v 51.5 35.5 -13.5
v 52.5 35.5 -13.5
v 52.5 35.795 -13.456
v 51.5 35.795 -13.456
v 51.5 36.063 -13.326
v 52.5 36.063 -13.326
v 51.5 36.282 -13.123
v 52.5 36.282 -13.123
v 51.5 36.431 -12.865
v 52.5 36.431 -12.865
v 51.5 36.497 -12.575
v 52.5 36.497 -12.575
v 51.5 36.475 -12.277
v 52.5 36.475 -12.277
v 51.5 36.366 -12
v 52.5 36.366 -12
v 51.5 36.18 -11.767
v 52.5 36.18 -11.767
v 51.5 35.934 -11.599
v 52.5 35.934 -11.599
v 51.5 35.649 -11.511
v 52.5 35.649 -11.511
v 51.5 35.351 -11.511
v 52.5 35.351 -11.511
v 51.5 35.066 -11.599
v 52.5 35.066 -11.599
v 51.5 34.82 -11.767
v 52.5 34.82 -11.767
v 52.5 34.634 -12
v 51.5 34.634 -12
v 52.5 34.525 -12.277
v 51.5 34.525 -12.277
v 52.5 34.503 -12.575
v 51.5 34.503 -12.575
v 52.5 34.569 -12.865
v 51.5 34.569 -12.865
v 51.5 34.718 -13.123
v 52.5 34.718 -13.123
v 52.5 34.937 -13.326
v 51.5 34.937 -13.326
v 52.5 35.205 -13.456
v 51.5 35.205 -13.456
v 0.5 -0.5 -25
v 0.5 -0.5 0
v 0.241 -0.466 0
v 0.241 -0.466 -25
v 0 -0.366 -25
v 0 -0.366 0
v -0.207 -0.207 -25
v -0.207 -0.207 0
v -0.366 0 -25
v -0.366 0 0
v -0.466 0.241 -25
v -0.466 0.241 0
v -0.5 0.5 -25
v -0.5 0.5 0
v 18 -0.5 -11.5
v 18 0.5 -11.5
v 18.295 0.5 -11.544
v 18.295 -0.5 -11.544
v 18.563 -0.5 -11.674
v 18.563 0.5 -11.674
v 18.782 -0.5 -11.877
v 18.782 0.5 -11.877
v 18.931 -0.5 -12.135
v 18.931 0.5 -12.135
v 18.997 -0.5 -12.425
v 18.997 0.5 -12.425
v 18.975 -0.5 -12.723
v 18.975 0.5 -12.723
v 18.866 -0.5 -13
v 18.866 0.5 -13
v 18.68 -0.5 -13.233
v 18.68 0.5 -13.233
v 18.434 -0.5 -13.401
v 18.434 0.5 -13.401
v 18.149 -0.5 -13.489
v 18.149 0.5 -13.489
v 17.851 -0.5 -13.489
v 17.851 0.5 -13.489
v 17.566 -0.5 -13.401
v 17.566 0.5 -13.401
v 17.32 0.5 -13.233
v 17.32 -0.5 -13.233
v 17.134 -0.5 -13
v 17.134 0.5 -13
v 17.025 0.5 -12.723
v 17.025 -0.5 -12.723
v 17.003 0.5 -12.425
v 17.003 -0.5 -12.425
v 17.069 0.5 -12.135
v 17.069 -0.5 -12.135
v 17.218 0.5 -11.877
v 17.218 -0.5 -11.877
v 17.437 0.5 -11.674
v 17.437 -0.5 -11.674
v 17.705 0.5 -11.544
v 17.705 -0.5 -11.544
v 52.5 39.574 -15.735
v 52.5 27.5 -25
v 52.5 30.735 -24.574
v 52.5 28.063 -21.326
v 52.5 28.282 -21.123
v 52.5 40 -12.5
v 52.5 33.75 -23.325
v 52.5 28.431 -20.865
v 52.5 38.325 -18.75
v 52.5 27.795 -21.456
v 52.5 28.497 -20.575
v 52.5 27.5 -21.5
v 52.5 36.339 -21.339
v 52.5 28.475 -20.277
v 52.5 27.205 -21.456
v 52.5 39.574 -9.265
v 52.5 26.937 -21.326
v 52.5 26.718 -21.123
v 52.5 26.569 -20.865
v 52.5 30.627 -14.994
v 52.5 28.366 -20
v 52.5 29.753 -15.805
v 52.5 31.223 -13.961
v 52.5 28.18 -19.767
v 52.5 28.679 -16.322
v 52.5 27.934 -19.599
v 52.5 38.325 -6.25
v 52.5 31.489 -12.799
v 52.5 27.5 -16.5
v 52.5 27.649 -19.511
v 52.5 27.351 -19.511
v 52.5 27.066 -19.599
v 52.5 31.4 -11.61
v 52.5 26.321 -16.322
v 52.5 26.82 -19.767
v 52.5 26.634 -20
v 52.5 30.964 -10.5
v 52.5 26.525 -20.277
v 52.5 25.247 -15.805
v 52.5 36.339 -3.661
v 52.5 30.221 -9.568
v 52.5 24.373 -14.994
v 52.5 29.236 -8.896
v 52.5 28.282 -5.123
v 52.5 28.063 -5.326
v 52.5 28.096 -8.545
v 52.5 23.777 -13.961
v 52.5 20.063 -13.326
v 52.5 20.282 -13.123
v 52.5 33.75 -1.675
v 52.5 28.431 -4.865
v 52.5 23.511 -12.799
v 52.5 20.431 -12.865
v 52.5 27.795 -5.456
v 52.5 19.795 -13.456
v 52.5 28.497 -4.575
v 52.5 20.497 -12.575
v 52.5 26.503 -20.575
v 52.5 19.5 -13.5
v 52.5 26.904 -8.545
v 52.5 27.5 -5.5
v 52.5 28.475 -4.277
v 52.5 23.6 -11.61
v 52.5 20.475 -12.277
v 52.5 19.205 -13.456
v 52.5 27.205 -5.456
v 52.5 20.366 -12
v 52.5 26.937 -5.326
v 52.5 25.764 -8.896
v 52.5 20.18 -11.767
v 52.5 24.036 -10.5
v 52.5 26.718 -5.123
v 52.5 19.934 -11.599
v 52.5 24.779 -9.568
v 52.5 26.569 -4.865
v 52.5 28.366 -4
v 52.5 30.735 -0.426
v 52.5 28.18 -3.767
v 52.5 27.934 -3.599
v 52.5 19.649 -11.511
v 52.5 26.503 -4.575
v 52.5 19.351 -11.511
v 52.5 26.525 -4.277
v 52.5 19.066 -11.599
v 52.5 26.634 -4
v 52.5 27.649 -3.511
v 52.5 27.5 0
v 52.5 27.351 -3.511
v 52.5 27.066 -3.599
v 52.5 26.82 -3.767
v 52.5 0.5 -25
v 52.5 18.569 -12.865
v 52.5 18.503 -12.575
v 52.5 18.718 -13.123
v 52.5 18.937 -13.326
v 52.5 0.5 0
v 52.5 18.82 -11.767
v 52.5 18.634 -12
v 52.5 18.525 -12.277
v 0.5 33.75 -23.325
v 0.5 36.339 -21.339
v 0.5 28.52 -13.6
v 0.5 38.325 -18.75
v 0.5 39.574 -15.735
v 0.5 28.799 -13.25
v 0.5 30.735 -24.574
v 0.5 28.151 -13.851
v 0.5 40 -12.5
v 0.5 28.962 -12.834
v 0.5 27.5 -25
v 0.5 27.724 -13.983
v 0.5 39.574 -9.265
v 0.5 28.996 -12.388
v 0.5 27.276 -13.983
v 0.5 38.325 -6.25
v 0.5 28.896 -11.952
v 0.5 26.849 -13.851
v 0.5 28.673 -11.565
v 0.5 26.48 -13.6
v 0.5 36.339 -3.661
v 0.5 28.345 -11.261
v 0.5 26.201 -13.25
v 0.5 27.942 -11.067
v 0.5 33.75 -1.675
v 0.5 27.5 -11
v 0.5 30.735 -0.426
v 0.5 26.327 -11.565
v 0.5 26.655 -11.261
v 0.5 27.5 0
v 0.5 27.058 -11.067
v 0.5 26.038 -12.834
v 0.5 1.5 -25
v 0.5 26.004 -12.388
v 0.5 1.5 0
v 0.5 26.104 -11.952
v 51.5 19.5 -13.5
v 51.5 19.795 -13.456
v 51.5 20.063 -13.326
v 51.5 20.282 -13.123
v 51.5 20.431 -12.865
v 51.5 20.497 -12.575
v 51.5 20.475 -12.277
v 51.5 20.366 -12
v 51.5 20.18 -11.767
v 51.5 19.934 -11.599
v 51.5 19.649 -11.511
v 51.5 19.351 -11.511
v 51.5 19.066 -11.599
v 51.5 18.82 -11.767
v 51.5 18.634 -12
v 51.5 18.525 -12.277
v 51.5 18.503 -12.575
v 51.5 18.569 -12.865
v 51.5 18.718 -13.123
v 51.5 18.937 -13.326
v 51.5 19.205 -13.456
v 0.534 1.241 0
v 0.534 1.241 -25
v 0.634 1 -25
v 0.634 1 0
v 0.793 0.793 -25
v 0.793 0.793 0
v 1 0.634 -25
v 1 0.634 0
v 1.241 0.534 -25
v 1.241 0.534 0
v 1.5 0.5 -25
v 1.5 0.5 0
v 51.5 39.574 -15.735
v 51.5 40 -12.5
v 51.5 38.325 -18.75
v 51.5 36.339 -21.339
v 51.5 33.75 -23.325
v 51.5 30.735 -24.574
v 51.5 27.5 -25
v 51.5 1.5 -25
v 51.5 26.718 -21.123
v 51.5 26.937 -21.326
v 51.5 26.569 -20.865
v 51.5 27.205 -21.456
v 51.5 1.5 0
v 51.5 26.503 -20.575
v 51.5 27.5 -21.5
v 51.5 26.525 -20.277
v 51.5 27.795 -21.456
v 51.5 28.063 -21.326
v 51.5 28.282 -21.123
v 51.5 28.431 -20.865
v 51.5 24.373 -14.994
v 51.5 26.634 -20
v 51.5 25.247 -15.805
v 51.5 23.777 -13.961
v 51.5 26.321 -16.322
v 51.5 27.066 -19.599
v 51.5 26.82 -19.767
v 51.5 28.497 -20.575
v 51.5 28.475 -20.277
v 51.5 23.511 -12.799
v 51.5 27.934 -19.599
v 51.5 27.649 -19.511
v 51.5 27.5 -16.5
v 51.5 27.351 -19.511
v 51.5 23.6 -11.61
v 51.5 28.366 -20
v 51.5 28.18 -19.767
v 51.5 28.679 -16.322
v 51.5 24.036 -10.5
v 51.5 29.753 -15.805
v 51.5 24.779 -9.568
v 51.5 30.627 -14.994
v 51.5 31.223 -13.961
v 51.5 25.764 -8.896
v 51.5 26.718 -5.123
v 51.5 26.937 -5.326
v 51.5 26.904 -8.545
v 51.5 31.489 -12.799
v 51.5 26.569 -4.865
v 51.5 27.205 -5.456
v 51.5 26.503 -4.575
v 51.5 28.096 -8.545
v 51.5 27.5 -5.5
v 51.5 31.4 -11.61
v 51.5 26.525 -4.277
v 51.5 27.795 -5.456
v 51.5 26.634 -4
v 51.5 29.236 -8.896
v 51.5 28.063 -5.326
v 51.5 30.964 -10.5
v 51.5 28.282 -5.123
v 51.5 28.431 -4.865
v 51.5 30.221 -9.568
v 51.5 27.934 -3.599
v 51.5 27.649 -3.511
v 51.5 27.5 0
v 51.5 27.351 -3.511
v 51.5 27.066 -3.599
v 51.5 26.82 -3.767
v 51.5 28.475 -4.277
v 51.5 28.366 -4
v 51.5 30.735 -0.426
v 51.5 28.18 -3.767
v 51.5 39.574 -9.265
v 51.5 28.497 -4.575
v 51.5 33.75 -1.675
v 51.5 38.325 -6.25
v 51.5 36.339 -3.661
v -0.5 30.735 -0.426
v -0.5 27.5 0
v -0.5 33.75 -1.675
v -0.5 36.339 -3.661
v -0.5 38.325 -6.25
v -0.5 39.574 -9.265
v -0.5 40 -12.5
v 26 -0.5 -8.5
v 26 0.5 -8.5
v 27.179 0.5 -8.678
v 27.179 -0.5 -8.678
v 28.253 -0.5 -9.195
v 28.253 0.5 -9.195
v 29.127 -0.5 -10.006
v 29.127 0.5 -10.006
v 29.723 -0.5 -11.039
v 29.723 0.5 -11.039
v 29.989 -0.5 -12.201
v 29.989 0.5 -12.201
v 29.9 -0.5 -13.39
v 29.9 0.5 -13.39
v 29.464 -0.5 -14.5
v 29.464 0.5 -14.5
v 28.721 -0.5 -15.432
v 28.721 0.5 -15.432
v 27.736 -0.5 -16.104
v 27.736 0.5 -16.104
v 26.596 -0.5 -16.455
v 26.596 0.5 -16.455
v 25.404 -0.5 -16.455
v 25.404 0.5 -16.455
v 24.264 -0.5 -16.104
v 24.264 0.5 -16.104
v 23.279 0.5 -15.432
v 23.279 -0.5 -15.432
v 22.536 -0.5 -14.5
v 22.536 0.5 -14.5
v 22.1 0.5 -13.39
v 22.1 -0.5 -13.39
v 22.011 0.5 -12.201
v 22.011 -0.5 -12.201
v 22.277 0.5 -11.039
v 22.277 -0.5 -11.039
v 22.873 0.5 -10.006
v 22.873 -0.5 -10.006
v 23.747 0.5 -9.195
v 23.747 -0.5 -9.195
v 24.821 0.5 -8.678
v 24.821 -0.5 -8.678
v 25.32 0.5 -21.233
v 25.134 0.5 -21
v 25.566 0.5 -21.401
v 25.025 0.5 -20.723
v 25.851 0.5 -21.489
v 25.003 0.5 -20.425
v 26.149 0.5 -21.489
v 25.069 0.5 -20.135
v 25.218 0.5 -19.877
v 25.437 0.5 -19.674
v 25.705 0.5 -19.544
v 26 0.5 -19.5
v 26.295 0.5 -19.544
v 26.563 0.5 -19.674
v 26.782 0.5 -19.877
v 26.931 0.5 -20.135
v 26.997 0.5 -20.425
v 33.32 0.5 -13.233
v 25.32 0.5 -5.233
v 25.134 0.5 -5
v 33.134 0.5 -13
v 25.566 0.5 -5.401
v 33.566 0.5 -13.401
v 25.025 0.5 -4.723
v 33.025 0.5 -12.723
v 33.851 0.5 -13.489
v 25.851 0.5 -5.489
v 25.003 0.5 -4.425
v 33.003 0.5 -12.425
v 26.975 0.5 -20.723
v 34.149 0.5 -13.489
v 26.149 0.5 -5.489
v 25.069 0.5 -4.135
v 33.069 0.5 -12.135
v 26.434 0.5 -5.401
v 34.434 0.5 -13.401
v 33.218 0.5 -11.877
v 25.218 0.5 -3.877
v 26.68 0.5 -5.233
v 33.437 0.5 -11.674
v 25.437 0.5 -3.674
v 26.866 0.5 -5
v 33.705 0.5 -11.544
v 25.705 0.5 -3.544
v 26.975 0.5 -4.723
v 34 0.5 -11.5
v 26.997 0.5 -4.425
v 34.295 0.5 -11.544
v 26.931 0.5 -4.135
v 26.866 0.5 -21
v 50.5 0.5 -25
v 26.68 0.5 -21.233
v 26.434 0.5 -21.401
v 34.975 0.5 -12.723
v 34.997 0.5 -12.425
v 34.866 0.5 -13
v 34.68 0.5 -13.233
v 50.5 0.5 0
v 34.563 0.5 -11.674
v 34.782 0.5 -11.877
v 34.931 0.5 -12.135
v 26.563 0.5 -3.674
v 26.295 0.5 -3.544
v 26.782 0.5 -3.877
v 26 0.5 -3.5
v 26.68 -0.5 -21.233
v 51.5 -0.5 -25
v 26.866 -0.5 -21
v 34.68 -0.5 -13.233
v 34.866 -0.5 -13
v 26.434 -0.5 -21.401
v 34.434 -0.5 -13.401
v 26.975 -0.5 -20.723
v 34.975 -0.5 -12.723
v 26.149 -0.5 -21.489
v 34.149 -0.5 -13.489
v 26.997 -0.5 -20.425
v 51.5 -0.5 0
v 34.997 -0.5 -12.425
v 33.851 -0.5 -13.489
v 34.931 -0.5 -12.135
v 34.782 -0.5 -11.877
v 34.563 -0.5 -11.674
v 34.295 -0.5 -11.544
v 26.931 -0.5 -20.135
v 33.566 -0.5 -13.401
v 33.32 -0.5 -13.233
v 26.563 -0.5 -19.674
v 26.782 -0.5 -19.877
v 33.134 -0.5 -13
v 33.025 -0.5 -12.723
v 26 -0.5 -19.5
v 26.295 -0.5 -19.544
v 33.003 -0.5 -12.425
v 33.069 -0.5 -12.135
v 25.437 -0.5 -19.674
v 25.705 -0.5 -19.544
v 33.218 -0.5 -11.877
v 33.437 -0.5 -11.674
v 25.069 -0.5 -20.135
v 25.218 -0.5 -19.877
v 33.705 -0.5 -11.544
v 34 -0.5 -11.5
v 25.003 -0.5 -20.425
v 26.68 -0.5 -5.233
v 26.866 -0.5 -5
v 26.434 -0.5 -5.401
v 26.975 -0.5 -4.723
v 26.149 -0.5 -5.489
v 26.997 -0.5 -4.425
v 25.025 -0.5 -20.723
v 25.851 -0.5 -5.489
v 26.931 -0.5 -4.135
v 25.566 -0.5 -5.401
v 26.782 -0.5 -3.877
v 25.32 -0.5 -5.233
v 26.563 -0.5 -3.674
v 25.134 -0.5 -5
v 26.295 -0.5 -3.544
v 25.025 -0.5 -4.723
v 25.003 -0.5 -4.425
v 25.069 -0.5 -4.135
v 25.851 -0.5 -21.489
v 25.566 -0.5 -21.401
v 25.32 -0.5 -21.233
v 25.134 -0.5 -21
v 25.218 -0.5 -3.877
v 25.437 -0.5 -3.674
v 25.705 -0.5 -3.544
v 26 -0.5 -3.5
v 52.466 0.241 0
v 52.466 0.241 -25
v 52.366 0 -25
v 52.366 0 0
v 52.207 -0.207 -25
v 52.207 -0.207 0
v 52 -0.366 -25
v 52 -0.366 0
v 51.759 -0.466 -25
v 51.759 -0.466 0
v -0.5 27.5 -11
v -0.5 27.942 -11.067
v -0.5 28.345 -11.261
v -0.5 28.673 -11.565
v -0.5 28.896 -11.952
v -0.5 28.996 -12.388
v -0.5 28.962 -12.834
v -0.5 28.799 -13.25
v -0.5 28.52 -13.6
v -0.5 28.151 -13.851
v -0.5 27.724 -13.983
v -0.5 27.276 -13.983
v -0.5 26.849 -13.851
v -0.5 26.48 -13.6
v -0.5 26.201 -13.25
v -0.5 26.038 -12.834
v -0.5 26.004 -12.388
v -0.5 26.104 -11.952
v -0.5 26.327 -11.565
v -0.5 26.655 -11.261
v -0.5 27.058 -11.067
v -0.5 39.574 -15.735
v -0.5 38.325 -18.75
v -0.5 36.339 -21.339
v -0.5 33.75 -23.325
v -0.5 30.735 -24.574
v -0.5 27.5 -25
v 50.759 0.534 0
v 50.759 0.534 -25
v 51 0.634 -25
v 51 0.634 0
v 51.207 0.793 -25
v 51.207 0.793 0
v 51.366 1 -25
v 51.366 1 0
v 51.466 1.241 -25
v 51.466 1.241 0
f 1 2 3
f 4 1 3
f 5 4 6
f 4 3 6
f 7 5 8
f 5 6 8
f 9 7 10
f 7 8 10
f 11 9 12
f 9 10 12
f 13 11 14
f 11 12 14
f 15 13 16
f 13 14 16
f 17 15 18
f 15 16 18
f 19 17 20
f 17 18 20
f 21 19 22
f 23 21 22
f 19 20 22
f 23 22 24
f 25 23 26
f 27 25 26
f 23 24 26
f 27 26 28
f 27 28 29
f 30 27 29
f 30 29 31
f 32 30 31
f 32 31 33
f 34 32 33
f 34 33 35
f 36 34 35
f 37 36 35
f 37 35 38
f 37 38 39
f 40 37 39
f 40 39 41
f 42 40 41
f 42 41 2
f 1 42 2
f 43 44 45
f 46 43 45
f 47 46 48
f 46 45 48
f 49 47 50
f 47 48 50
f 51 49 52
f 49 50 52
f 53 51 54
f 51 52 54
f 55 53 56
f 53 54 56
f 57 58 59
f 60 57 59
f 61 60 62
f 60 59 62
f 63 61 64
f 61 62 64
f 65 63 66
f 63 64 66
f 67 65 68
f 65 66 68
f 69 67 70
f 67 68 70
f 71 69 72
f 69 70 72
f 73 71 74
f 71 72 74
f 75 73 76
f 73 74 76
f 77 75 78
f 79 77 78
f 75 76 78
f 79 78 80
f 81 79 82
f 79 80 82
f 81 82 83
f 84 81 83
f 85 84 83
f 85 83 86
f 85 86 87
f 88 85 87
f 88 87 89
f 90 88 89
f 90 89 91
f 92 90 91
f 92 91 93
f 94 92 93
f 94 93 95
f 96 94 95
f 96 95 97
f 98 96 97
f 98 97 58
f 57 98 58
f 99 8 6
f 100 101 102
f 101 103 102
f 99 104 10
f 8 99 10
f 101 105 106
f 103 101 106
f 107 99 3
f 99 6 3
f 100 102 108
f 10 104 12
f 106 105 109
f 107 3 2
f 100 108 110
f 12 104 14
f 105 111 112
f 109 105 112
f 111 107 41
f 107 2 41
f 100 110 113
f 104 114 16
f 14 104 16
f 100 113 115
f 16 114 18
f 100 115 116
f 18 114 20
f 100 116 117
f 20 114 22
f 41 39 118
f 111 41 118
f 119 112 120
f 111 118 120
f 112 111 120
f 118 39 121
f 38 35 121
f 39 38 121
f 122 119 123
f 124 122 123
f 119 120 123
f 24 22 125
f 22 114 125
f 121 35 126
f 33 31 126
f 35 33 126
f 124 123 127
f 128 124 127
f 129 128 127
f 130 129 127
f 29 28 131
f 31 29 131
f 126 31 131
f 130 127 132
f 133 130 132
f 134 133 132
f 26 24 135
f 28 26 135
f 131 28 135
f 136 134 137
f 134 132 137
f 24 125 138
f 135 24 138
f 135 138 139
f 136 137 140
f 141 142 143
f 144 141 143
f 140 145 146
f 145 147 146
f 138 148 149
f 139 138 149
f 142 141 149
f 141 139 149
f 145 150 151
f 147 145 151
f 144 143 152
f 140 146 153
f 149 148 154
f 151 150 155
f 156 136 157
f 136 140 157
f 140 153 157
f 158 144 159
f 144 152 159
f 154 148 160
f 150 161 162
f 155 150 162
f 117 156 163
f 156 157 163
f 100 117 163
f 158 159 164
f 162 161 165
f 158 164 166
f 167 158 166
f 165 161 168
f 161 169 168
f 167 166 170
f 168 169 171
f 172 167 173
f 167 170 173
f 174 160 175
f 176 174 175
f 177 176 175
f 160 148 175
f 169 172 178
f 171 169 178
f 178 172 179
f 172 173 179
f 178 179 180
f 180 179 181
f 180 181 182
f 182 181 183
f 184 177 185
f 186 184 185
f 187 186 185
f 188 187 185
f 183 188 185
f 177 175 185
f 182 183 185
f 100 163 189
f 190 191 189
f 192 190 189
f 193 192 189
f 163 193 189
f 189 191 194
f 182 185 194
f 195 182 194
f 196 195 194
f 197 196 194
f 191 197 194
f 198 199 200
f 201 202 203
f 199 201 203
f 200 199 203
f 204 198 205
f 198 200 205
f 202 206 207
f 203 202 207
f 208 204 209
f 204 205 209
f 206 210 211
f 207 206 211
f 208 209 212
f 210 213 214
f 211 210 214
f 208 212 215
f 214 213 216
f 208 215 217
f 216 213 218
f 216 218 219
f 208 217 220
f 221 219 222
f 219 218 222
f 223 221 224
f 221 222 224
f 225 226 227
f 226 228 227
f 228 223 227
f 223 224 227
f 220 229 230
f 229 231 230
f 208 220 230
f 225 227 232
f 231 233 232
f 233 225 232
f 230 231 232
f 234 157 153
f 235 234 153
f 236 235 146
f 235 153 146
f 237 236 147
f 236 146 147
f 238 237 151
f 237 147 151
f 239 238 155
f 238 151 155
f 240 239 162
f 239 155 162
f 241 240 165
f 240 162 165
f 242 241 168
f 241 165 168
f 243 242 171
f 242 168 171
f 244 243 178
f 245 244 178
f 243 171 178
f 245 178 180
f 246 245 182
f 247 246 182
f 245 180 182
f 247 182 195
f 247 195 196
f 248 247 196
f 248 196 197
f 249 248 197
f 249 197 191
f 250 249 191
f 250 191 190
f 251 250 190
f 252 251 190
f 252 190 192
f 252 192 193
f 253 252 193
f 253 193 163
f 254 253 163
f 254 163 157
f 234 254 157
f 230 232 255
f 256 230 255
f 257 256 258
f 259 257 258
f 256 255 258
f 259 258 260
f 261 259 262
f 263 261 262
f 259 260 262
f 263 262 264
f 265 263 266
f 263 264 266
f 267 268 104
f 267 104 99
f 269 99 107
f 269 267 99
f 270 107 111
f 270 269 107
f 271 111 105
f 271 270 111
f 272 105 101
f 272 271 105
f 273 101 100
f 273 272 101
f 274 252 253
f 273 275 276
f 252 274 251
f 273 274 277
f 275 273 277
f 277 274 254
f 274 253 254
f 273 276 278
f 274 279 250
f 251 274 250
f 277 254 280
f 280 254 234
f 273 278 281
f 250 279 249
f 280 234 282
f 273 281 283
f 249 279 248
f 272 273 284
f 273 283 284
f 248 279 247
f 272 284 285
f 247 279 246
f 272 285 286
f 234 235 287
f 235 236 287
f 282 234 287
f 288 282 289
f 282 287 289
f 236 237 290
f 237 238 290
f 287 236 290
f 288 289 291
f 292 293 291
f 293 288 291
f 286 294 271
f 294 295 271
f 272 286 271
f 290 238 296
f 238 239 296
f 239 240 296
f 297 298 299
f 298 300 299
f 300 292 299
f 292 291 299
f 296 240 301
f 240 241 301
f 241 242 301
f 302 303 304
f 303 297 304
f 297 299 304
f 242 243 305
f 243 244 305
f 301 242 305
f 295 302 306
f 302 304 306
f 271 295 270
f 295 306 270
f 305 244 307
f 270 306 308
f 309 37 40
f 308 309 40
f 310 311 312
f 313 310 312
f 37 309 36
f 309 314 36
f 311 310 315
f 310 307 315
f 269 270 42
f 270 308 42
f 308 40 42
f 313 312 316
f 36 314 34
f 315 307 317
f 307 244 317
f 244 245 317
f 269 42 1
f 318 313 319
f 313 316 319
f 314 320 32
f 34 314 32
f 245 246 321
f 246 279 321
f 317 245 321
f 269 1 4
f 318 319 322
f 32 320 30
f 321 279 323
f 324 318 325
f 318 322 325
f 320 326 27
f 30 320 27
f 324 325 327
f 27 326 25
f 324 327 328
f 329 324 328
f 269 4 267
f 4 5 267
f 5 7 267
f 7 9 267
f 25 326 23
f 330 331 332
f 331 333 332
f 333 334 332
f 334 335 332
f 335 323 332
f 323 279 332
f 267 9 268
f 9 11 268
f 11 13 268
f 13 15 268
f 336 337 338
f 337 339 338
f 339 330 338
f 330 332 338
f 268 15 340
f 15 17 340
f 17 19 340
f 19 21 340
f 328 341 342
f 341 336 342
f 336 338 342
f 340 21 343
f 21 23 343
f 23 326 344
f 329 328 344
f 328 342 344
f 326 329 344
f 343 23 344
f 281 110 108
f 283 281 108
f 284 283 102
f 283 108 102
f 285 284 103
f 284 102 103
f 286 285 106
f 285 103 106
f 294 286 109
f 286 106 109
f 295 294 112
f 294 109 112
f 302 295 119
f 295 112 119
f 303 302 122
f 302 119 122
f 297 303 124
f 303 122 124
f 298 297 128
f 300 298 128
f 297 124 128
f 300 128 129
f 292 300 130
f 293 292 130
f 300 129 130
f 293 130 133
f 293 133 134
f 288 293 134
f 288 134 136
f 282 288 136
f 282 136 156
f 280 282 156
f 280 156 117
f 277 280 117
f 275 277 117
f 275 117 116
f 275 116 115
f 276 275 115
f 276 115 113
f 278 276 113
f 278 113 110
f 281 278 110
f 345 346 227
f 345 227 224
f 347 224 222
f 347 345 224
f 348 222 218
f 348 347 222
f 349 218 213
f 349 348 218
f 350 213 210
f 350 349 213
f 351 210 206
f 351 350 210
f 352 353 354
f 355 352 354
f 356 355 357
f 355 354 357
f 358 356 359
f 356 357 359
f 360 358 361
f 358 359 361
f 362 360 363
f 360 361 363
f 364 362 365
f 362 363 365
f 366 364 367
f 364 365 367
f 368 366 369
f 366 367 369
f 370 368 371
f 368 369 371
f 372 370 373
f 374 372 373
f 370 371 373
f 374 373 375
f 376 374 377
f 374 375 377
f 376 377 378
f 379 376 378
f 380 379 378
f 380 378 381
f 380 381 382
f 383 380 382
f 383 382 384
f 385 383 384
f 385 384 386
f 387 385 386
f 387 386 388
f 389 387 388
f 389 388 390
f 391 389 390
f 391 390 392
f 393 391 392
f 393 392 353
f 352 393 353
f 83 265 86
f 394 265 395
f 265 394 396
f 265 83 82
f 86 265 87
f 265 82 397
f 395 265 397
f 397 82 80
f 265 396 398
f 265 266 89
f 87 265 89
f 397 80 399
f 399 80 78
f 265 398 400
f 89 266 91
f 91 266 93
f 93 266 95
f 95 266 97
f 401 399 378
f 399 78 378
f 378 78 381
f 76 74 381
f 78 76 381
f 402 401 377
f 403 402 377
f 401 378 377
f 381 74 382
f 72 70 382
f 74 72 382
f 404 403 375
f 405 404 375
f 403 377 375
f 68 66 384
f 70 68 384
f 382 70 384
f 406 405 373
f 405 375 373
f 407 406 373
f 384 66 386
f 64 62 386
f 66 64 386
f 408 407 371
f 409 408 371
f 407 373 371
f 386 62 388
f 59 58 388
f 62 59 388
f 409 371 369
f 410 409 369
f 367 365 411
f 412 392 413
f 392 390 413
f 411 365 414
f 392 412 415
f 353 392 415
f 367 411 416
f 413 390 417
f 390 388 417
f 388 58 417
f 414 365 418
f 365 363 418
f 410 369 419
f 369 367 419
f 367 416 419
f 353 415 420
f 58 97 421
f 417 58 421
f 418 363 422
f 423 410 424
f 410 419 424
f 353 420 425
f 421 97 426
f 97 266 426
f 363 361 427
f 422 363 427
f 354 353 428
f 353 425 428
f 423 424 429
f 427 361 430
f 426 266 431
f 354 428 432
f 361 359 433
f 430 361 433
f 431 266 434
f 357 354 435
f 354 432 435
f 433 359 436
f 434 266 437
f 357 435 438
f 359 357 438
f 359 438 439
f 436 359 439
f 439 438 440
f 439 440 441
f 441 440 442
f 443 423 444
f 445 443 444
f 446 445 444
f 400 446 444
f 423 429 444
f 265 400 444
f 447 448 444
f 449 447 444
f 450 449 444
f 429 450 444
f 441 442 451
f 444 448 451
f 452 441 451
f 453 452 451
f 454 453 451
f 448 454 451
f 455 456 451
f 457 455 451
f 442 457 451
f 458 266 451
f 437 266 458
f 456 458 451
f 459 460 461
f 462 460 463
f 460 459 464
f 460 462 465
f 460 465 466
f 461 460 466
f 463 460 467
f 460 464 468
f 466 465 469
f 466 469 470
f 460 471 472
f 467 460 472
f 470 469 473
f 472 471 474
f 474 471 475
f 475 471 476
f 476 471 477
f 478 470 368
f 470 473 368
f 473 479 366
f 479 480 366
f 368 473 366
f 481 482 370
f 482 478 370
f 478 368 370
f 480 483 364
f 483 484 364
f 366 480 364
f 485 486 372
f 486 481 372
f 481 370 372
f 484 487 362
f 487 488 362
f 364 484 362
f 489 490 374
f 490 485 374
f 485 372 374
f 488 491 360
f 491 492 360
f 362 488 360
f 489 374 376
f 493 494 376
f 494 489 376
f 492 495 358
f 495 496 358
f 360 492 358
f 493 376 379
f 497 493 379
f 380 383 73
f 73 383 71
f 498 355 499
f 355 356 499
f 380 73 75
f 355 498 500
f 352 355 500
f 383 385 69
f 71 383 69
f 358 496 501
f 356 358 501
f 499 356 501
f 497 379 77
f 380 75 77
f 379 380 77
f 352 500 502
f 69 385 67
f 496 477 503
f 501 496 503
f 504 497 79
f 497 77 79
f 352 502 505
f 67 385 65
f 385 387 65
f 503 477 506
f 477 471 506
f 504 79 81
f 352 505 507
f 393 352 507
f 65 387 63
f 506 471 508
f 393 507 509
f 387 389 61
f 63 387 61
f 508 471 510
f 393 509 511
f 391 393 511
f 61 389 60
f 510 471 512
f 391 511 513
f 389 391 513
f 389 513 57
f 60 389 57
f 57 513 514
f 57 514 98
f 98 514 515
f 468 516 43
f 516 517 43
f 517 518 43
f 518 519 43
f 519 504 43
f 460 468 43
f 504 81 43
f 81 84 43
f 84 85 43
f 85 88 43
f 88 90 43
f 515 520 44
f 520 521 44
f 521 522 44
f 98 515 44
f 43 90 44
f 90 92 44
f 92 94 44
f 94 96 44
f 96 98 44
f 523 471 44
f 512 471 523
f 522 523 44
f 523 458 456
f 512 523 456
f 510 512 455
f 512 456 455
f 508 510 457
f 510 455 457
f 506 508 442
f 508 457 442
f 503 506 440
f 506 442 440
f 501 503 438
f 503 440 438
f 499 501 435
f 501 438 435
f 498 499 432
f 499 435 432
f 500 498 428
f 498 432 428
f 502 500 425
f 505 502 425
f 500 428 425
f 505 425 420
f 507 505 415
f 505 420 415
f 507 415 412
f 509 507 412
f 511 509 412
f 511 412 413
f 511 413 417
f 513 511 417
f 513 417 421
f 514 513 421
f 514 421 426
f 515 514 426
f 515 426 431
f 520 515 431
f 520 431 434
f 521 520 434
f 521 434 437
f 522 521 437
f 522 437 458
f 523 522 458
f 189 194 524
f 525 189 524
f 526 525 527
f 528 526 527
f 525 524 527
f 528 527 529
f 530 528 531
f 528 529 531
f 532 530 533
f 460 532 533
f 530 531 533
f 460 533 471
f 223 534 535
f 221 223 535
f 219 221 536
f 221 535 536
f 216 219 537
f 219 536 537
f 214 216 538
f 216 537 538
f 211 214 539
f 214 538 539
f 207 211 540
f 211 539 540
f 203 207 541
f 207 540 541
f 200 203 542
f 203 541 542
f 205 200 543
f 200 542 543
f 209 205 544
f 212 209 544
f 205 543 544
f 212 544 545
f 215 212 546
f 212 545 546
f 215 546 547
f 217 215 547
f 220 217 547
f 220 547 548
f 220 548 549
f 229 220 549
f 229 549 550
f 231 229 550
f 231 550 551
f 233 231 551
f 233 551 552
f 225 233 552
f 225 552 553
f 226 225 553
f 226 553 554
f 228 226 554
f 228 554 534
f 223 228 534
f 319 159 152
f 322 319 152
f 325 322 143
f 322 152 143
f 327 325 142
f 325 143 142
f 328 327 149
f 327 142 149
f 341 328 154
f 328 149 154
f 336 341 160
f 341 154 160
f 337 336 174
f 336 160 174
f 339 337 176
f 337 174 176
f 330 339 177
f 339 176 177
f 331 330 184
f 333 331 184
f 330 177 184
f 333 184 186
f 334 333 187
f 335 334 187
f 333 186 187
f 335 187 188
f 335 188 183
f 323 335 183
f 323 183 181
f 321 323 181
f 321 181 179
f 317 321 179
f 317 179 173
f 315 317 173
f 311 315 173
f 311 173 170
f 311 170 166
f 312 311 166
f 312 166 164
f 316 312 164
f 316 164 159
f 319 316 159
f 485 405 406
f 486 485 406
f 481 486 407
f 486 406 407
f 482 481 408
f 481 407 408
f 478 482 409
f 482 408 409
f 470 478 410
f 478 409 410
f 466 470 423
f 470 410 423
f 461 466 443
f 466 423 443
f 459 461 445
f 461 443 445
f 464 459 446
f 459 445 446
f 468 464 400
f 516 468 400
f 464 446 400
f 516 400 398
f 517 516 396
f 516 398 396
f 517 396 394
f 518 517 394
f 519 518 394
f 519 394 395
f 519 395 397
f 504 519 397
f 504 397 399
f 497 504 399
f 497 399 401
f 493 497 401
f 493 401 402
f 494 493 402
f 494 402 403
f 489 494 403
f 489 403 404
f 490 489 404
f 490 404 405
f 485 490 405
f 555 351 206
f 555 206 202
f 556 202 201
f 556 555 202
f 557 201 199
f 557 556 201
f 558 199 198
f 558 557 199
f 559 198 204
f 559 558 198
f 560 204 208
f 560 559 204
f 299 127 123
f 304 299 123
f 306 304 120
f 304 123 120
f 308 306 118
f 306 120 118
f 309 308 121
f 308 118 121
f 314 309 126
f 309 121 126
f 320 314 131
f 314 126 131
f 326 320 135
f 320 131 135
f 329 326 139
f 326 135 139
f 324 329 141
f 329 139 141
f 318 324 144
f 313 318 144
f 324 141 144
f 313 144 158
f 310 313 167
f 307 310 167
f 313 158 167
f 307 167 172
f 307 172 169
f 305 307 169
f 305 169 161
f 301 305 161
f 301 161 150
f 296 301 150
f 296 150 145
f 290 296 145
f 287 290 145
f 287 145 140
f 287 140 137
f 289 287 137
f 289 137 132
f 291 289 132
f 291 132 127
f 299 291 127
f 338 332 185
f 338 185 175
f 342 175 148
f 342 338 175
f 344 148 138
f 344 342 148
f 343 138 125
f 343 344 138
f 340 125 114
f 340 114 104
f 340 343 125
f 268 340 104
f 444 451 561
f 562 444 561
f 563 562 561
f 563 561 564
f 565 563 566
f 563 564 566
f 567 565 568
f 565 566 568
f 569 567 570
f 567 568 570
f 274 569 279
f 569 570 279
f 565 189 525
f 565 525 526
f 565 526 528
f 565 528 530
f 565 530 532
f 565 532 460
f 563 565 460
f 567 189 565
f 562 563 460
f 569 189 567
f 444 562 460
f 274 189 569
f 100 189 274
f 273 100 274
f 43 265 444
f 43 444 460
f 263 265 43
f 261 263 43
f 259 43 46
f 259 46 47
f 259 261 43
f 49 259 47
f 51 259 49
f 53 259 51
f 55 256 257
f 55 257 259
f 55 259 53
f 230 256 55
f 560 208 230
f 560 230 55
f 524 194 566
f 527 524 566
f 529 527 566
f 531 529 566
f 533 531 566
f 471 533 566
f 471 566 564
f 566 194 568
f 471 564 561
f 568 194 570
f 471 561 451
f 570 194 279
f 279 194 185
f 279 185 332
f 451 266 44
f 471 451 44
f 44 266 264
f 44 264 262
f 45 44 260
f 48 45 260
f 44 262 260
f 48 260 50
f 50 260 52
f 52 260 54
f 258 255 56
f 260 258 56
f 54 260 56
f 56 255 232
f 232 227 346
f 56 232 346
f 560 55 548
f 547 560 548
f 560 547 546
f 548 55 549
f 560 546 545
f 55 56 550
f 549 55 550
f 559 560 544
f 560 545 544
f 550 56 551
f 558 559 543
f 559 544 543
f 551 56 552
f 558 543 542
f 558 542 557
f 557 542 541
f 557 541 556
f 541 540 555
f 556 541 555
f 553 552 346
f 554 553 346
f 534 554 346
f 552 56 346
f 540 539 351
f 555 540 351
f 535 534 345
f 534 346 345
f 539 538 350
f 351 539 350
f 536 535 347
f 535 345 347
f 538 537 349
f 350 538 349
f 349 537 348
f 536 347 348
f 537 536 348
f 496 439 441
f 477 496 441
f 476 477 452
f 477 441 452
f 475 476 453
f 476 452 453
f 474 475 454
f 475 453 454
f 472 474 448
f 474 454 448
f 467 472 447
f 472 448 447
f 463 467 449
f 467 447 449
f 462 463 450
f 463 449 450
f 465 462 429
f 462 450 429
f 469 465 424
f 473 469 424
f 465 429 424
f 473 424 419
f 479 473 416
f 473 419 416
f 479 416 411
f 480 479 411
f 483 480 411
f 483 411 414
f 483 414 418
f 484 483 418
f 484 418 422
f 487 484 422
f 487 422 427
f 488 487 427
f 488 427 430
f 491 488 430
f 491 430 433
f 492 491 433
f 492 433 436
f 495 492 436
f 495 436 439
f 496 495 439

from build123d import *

# Parameters (mm, degrees)
BOSS_EXTRUDE1_DEPTH = 25
CUT_EXTRUDE1_DEPTH  = 71.9506871
SKETCH3_R           = 4
SKETCH3_R_2         = 1
CUT_EXTRUDE2_DEPTH  = 71.295803573
SKETCH4_R           = 4
SKETCH4_R_2         = 1
CUT_EXTRUDE3_DEPTH  = 25
SKETCH5_R           = 1.5
CUT_EXTRUDE4_DEPTH  = 25


with BuildPart() as part:
    # Sketch1 → Boss-Extrude1 (new body)
    with BuildSketch(Plane.XY):
        with BuildLine():
            Line((-0.5, 40), (0.5, 40))
            Line((0.5, 40), (0.5, 1.5))
            ThreePointArc((0.5, 1.5), (0.792893219, 0.792893219), (1.5, 0.5))
            Line((1.5, 0.5), (50.5, 0.5))
            ThreePointArc((50.5, 0.5), (51.207106781, 0.792893219), (51.5, 1.5))
            Line((51.5, 1.5), (51.5, 40))
            Line((51.5, 40), (52.5, 40))
            Line((52.5, 40), (52.5, 0.5))
            ThreePointArc((52.5, 0.5), (52.207106781, -0.207106781), (51.5, -0.5))
            Line((51.5, -0.5), (0.5, -0.5))
            ThreePointArc((0.5, -0.5), (-0.207106781, -0.207106781), (-0.5, 0.5))
            Line((-0.5, 0.5), (-0.5, 40))
        make_face()
    extrude(amount=-BOSS_EXTRUDE1_DEPTH)

    # Sketch2 → Cut-Extrude1 (cut, through all)
    with BuildSketch(Plane(origin=(52.5, 0, 0), x_dir=(0, 0, -1), z_dir=(1, 0, 0))):
        with BuildLine():
            Line((25, 40), (12.5, 40))
            ThreePointArc((12.5, 40), (21.338834765, 36.338834765), (25, 27.5))
            Line((25, 27.5), (25, 40))
        make_face()
        with BuildLine():
            Line((0, 40), (0, 27.5))
            ThreePointArc((0, 27.5), (3.661165235, 36.338834765), (12.5, 40))
            Line((12.5, 40), (0, 40))
        make_face()
    extrude(amount=-CUT_EXTRUDE1_DEPTH, mode=Mode.SUBTRACT)

    # Sketch3 → Cut-Extrude2 (cut, through all)
    with BuildSketch(Plane(origin=(0, 0.5, 0), x_dir=(1, 0, 0), z_dir=(0, 1, 0))):
        with Locations((26, 12.5)):
            Circle(SKETCH3_R)
        with Locations((34, 12.5)):
            Circle(SKETCH3_R_2)
        with Locations((26, 20.5)):
            Circle(SKETCH3_R_2)
        with Locations((26, 4.5)):
            Circle(SKETCH3_R_2)
        with Locations((18, 12.5)):
            Circle(SKETCH3_R_2)
    extrude(amount=-CUT_EXTRUDE2_DEPTH, mode=Mode.SUBTRACT)

    # Sketch4 → Cut-Extrude3 (cut)
    with BuildSketch(Plane(origin=(52.5, 0, 0), x_dir=(0, 0, -1), z_dir=(1, 0, 0))):
        with Locations((12.5, 27.5)):
            Circle(SKETCH4_R)
        with Locations((20.5, 27.5)):
            Circle(SKETCH4_R_2)
        with Locations((12.5, 35.5)):
            Circle(SKETCH4_R_2)
        with Locations((12.5, 19.5)):
            Circle(SKETCH4_R_2)
        with Locations((4.5, 27.5)):
            Circle(SKETCH4_R_2)
    extrude(amount=-CUT_EXTRUDE3_DEPTH, mode=Mode.SUBTRACT)

    # Sketch5 → Cut-Extrude4 (cut)
    with BuildSketch(Plane.ZY.offset(0.5)):
        with Locations((-12.5, 27.5)):
            Circle(SKETCH5_R)
    extrude(amount=-CUT_EXTRUDE4_DEPTH, mode=Mode.SUBTRACT)


solid = part.part
